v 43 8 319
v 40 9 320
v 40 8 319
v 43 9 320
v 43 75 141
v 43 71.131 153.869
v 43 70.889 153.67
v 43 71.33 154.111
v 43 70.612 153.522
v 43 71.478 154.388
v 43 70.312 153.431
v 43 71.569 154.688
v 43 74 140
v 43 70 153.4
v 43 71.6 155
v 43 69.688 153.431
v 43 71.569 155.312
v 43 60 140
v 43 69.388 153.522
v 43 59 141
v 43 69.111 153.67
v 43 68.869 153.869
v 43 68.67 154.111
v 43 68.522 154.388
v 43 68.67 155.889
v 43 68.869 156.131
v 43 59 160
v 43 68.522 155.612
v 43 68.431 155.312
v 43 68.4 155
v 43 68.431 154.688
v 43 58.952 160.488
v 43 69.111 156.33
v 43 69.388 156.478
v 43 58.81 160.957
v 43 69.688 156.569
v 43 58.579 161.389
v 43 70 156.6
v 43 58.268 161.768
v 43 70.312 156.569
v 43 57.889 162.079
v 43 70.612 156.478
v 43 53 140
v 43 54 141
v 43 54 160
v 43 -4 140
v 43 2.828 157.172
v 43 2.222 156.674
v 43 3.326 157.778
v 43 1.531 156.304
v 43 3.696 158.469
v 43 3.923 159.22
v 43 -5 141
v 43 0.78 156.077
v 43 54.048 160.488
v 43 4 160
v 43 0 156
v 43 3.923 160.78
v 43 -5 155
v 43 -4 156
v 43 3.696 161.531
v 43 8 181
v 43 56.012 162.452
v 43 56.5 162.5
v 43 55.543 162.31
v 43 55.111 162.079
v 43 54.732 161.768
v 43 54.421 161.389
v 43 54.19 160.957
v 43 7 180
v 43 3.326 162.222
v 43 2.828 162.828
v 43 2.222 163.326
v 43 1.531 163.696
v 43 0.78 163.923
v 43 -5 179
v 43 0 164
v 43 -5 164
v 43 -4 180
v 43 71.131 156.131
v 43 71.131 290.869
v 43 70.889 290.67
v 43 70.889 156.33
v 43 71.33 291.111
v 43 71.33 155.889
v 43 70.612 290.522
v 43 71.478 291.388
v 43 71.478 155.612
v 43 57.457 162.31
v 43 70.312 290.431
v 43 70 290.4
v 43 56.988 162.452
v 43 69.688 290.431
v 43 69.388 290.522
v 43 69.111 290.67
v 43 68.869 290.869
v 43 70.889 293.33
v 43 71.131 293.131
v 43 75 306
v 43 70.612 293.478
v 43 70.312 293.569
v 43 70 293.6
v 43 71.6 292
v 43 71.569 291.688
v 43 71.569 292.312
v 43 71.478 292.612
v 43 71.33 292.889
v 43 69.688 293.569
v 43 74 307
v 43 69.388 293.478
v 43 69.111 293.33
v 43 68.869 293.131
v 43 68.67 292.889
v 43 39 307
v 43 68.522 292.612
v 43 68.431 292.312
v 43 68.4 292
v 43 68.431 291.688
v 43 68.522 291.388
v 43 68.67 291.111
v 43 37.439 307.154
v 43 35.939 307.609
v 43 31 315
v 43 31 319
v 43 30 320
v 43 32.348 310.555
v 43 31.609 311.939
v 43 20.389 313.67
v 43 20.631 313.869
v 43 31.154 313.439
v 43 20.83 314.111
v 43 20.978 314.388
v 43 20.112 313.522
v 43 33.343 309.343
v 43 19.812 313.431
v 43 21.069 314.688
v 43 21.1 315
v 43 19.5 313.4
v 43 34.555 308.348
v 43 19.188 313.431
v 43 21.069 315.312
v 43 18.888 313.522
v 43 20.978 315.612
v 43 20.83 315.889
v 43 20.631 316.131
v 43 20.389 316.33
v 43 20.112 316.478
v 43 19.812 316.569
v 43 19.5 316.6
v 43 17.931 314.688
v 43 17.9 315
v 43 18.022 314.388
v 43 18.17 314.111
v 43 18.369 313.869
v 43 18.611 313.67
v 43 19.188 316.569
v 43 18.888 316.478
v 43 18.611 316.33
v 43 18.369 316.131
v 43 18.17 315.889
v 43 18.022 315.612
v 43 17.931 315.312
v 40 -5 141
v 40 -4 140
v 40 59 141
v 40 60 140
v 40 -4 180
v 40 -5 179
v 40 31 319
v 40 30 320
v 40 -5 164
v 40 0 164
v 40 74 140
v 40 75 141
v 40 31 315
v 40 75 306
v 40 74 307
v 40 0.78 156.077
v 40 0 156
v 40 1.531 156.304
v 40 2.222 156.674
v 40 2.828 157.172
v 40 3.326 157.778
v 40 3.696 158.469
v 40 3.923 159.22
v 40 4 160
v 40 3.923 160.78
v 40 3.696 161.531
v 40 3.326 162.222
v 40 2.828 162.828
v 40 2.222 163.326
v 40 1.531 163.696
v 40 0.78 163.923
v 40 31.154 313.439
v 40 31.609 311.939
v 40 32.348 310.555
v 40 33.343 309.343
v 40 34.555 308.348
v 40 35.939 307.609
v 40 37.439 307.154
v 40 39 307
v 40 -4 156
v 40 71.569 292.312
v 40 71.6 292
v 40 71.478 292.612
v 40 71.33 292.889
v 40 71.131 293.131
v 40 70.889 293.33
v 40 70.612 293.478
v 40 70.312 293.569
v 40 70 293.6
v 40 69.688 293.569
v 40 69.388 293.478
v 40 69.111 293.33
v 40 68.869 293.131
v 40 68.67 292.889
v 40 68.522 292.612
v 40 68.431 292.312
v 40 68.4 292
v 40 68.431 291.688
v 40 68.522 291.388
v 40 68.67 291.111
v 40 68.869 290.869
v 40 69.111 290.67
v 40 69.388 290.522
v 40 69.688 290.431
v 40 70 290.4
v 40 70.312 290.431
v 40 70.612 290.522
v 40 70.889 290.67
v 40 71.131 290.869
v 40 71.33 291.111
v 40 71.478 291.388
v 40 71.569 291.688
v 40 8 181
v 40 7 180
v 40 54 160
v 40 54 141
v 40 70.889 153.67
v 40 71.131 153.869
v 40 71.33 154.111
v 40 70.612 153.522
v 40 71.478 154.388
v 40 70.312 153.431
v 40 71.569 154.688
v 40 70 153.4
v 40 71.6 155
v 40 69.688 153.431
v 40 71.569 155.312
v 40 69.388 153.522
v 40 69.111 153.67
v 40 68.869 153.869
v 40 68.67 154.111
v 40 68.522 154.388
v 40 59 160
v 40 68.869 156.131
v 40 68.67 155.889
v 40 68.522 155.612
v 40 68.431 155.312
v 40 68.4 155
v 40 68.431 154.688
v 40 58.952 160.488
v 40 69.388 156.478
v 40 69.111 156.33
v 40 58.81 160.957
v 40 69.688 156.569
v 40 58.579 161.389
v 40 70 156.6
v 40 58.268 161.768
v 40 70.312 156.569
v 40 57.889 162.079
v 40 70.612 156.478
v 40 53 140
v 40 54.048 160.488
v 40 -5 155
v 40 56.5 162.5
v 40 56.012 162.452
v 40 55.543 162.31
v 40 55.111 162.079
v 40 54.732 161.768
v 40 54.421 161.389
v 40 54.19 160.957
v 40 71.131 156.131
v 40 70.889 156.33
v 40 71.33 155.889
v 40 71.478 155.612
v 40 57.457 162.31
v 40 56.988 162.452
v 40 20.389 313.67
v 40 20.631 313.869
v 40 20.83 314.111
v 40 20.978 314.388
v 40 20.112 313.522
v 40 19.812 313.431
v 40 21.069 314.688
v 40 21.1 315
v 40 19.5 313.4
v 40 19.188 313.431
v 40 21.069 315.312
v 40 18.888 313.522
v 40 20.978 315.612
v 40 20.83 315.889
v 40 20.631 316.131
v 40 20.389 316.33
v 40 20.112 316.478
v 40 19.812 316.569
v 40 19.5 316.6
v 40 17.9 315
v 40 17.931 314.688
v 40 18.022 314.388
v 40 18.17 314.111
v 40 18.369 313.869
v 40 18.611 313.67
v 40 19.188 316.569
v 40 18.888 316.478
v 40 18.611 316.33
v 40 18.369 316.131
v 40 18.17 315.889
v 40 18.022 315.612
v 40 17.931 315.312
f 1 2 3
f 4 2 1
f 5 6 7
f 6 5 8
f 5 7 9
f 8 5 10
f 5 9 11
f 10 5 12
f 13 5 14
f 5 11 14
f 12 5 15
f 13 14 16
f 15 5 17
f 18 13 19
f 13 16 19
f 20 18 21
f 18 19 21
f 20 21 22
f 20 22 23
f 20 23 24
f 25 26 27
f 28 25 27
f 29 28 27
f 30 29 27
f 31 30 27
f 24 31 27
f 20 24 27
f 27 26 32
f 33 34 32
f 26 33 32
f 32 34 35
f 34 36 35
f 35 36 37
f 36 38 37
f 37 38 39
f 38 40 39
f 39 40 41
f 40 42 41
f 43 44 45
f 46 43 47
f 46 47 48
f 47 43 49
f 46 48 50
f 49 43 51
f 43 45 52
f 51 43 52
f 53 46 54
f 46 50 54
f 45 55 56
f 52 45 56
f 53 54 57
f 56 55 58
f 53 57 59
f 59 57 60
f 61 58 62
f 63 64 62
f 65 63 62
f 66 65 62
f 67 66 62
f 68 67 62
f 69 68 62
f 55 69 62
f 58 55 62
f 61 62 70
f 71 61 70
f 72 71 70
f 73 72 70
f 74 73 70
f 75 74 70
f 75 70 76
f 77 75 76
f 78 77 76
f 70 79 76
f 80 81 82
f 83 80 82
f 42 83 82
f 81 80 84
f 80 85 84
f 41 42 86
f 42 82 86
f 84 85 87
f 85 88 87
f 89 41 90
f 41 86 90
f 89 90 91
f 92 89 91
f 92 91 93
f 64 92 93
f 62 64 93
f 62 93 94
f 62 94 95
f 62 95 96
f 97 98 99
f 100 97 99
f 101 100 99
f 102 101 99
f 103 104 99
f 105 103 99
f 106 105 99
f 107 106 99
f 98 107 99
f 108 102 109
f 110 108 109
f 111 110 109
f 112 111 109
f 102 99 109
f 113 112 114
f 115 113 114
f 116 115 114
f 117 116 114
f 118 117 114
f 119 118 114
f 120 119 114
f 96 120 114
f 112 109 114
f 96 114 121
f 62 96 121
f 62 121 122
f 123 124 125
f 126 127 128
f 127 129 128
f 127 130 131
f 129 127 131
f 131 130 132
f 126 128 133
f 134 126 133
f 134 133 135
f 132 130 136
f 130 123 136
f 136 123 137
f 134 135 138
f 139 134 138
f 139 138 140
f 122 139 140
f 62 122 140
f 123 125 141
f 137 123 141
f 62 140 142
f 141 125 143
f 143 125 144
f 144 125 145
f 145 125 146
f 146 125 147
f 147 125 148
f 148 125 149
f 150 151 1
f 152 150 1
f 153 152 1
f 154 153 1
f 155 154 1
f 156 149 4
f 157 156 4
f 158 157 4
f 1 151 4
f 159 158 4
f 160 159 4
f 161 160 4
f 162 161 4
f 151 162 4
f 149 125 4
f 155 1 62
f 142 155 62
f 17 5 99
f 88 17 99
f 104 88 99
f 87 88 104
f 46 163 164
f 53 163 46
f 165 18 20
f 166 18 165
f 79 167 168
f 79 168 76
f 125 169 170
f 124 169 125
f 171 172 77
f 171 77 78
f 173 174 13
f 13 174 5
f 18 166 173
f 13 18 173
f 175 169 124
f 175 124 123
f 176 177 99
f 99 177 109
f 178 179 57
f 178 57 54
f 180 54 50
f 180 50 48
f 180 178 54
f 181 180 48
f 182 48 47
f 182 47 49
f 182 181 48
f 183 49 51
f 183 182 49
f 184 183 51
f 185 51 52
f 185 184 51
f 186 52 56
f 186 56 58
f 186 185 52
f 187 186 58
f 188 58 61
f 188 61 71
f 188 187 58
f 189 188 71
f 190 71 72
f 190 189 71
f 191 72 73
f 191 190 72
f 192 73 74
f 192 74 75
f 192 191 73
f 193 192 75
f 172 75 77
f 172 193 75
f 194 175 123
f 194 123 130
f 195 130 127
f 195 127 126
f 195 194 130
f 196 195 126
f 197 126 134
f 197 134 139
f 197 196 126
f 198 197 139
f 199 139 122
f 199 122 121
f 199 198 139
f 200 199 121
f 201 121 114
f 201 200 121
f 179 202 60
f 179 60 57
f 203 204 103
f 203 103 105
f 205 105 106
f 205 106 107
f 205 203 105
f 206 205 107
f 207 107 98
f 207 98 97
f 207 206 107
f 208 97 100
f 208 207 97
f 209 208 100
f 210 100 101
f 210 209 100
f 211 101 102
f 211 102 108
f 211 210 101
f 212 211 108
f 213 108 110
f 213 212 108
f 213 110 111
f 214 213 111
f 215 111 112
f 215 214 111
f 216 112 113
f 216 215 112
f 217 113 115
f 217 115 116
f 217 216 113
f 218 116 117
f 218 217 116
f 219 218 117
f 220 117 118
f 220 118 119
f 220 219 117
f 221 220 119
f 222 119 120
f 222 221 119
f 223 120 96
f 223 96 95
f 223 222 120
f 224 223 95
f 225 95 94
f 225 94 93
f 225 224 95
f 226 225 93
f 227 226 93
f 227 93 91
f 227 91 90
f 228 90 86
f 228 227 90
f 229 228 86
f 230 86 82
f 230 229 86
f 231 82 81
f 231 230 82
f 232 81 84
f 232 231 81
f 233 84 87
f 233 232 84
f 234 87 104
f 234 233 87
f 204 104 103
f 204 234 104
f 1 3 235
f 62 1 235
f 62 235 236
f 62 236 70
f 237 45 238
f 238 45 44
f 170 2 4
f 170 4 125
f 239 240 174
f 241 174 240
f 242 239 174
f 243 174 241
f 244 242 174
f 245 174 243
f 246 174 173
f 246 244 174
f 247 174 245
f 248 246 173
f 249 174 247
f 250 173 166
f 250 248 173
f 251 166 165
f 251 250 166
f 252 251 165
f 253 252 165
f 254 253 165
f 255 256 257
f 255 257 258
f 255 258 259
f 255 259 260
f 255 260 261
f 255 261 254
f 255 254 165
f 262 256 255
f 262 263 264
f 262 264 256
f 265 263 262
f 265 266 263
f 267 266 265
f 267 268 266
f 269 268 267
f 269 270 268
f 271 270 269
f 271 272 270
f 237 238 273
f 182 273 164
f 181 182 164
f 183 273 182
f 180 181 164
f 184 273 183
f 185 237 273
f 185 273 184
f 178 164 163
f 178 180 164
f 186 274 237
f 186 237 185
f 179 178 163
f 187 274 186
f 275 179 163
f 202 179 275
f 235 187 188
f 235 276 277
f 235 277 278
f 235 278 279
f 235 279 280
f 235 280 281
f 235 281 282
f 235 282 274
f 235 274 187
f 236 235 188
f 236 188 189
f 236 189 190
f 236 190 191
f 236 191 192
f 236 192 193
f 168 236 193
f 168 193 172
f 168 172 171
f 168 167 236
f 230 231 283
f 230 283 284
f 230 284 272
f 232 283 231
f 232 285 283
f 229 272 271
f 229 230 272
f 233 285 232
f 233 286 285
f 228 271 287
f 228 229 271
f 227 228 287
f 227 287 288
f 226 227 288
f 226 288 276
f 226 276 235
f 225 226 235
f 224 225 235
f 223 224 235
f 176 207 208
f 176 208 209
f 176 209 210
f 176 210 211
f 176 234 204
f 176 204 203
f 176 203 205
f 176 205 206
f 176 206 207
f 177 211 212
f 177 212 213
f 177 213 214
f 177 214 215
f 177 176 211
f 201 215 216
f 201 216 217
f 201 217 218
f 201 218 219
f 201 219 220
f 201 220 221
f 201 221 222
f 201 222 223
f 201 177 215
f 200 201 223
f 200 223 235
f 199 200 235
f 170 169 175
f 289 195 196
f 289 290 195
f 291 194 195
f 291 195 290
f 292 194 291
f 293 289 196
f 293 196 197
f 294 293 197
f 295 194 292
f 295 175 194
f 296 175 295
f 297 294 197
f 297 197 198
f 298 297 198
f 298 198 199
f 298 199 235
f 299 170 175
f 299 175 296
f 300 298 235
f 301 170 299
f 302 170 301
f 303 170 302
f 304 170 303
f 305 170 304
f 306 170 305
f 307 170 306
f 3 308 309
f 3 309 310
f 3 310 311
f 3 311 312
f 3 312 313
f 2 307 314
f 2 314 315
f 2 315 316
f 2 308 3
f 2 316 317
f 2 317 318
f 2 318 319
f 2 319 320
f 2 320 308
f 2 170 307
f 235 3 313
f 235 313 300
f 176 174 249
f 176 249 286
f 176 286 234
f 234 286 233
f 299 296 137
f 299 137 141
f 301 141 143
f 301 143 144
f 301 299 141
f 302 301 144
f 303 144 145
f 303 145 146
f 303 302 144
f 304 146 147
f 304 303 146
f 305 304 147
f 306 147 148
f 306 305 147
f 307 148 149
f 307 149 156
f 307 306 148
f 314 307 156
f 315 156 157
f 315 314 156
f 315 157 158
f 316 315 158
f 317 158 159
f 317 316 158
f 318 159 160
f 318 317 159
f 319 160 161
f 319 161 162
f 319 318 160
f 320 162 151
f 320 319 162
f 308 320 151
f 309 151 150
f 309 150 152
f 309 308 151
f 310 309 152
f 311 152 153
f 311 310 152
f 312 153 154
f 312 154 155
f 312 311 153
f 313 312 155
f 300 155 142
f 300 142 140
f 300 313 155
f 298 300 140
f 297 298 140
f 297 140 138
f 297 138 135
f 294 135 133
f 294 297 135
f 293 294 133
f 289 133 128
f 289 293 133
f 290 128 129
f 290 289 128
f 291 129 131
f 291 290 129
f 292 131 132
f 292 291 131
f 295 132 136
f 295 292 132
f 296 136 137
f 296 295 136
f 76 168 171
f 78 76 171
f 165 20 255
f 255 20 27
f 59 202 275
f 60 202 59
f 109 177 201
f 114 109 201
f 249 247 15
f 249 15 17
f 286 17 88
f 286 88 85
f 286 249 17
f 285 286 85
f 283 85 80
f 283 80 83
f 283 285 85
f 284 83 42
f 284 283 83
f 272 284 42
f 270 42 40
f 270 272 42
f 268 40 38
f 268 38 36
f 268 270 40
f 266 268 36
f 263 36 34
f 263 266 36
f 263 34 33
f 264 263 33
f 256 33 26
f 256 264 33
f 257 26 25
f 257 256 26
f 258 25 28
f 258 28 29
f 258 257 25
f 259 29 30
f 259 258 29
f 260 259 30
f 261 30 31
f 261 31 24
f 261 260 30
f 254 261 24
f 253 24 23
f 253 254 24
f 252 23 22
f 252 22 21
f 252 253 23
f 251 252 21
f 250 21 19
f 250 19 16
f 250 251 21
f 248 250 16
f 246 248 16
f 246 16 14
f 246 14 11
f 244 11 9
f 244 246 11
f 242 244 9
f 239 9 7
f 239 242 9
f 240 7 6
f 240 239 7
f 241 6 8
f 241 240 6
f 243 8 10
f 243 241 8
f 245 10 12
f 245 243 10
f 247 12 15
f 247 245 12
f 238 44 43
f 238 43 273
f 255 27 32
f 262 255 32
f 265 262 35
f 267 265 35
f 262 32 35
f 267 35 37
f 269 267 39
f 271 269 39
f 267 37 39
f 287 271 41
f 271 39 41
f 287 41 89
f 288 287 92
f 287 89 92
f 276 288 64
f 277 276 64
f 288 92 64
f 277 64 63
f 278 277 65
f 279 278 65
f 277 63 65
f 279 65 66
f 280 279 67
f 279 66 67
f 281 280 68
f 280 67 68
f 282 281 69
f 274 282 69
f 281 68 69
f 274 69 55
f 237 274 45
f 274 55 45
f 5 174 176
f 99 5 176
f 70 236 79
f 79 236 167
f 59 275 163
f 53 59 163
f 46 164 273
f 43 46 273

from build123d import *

# Parameters (mm, degrees)
SKETCH_R        = 1.6
PAD_DEPTH       = 3
POCKET014_DEPTH = 3.001
CHAMFER059_SIZE = 1
CHAMFER_SIZE    = 1


with BuildPart() as part:
    # Sketch → Pad (new body)
    with BuildSketch(Plane.YZ.offset(40)):
        with BuildLine():
            Line((8, 320), (31, 320))
            Line((31, 320), (31, 315))
            ThreePointArc((31, 315), (33.343146, 309.343146), (39, 307))
            Line((75, 307), (39, 307))
            Line((75, 140), (75, 307))
            Line((-5, 140), (75, 140))
            Line((-5, 156), (-5, 140))
            Line((-5, 156), (0, 156))
            ThreePointArc((0, 156), (4, 160), (0, 164))
            Line((0, 164), (-5, 164))
            Line((-5, 180), (-5, 164))
            Line((8, 180), (-5, 180))
            Line((8, 320), (8, 180))
        make_face()
        with Locations((19.5, 315)):
            Circle(SKETCH_R, mode=Mode.SUBTRACT)
        with Locations((70, 292)):
            Circle(SKETCH_R, mode=Mode.SUBTRACT)
        with Locations((70, 155)):
            Circle(SKETCH_R, mode=Mode.SUBTRACT)
    extrude(amount=PAD_DEPTH)

    # Sketch158 (on Face18 of Pad) → Pocket014 (cut, through all)
    with BuildSketch(Plane.YZ.offset(43)):
        with BuildLine():
            ThreePointArc((54, 140), (56.5, 137.5), (59, 140))
            Line((59, 140), (59, 160))
            ThreePointArc((59, 160), (56.5, 162.5), (54, 160))
            Line((54, 160), (54, 140))
        make_face()
    extrude(amount=-POCKET014_DEPTH, mode=Mode.SUBTRACT)

    # Chamfer059
    chamfer059_edges = [part.edges().sort_by_distance(p)[0] for p in [
        (41.5, 54, 140),
        (41.5, 59, 140),
    ]]
    chamfer(chamfer059_edges, length=CHAMFER059_SIZE)

    # Chamfer
    chamfer_edges = [part.edges().sort_by_distance(p)[0] for p in [
        (41.5, -5, 180),
        (41.5, 8, 180),
        (41.5, -5, 140),
        (41.5, -5, 156),
        (41.5, 75, 140),
        (41.5, 75, 307),
        (41.5, 31, 320),
        (41.5, 8, 320),
    ]]
    chamfer(chamfer_edges, length=CHAMFER_SIZE)


solid = part.part
